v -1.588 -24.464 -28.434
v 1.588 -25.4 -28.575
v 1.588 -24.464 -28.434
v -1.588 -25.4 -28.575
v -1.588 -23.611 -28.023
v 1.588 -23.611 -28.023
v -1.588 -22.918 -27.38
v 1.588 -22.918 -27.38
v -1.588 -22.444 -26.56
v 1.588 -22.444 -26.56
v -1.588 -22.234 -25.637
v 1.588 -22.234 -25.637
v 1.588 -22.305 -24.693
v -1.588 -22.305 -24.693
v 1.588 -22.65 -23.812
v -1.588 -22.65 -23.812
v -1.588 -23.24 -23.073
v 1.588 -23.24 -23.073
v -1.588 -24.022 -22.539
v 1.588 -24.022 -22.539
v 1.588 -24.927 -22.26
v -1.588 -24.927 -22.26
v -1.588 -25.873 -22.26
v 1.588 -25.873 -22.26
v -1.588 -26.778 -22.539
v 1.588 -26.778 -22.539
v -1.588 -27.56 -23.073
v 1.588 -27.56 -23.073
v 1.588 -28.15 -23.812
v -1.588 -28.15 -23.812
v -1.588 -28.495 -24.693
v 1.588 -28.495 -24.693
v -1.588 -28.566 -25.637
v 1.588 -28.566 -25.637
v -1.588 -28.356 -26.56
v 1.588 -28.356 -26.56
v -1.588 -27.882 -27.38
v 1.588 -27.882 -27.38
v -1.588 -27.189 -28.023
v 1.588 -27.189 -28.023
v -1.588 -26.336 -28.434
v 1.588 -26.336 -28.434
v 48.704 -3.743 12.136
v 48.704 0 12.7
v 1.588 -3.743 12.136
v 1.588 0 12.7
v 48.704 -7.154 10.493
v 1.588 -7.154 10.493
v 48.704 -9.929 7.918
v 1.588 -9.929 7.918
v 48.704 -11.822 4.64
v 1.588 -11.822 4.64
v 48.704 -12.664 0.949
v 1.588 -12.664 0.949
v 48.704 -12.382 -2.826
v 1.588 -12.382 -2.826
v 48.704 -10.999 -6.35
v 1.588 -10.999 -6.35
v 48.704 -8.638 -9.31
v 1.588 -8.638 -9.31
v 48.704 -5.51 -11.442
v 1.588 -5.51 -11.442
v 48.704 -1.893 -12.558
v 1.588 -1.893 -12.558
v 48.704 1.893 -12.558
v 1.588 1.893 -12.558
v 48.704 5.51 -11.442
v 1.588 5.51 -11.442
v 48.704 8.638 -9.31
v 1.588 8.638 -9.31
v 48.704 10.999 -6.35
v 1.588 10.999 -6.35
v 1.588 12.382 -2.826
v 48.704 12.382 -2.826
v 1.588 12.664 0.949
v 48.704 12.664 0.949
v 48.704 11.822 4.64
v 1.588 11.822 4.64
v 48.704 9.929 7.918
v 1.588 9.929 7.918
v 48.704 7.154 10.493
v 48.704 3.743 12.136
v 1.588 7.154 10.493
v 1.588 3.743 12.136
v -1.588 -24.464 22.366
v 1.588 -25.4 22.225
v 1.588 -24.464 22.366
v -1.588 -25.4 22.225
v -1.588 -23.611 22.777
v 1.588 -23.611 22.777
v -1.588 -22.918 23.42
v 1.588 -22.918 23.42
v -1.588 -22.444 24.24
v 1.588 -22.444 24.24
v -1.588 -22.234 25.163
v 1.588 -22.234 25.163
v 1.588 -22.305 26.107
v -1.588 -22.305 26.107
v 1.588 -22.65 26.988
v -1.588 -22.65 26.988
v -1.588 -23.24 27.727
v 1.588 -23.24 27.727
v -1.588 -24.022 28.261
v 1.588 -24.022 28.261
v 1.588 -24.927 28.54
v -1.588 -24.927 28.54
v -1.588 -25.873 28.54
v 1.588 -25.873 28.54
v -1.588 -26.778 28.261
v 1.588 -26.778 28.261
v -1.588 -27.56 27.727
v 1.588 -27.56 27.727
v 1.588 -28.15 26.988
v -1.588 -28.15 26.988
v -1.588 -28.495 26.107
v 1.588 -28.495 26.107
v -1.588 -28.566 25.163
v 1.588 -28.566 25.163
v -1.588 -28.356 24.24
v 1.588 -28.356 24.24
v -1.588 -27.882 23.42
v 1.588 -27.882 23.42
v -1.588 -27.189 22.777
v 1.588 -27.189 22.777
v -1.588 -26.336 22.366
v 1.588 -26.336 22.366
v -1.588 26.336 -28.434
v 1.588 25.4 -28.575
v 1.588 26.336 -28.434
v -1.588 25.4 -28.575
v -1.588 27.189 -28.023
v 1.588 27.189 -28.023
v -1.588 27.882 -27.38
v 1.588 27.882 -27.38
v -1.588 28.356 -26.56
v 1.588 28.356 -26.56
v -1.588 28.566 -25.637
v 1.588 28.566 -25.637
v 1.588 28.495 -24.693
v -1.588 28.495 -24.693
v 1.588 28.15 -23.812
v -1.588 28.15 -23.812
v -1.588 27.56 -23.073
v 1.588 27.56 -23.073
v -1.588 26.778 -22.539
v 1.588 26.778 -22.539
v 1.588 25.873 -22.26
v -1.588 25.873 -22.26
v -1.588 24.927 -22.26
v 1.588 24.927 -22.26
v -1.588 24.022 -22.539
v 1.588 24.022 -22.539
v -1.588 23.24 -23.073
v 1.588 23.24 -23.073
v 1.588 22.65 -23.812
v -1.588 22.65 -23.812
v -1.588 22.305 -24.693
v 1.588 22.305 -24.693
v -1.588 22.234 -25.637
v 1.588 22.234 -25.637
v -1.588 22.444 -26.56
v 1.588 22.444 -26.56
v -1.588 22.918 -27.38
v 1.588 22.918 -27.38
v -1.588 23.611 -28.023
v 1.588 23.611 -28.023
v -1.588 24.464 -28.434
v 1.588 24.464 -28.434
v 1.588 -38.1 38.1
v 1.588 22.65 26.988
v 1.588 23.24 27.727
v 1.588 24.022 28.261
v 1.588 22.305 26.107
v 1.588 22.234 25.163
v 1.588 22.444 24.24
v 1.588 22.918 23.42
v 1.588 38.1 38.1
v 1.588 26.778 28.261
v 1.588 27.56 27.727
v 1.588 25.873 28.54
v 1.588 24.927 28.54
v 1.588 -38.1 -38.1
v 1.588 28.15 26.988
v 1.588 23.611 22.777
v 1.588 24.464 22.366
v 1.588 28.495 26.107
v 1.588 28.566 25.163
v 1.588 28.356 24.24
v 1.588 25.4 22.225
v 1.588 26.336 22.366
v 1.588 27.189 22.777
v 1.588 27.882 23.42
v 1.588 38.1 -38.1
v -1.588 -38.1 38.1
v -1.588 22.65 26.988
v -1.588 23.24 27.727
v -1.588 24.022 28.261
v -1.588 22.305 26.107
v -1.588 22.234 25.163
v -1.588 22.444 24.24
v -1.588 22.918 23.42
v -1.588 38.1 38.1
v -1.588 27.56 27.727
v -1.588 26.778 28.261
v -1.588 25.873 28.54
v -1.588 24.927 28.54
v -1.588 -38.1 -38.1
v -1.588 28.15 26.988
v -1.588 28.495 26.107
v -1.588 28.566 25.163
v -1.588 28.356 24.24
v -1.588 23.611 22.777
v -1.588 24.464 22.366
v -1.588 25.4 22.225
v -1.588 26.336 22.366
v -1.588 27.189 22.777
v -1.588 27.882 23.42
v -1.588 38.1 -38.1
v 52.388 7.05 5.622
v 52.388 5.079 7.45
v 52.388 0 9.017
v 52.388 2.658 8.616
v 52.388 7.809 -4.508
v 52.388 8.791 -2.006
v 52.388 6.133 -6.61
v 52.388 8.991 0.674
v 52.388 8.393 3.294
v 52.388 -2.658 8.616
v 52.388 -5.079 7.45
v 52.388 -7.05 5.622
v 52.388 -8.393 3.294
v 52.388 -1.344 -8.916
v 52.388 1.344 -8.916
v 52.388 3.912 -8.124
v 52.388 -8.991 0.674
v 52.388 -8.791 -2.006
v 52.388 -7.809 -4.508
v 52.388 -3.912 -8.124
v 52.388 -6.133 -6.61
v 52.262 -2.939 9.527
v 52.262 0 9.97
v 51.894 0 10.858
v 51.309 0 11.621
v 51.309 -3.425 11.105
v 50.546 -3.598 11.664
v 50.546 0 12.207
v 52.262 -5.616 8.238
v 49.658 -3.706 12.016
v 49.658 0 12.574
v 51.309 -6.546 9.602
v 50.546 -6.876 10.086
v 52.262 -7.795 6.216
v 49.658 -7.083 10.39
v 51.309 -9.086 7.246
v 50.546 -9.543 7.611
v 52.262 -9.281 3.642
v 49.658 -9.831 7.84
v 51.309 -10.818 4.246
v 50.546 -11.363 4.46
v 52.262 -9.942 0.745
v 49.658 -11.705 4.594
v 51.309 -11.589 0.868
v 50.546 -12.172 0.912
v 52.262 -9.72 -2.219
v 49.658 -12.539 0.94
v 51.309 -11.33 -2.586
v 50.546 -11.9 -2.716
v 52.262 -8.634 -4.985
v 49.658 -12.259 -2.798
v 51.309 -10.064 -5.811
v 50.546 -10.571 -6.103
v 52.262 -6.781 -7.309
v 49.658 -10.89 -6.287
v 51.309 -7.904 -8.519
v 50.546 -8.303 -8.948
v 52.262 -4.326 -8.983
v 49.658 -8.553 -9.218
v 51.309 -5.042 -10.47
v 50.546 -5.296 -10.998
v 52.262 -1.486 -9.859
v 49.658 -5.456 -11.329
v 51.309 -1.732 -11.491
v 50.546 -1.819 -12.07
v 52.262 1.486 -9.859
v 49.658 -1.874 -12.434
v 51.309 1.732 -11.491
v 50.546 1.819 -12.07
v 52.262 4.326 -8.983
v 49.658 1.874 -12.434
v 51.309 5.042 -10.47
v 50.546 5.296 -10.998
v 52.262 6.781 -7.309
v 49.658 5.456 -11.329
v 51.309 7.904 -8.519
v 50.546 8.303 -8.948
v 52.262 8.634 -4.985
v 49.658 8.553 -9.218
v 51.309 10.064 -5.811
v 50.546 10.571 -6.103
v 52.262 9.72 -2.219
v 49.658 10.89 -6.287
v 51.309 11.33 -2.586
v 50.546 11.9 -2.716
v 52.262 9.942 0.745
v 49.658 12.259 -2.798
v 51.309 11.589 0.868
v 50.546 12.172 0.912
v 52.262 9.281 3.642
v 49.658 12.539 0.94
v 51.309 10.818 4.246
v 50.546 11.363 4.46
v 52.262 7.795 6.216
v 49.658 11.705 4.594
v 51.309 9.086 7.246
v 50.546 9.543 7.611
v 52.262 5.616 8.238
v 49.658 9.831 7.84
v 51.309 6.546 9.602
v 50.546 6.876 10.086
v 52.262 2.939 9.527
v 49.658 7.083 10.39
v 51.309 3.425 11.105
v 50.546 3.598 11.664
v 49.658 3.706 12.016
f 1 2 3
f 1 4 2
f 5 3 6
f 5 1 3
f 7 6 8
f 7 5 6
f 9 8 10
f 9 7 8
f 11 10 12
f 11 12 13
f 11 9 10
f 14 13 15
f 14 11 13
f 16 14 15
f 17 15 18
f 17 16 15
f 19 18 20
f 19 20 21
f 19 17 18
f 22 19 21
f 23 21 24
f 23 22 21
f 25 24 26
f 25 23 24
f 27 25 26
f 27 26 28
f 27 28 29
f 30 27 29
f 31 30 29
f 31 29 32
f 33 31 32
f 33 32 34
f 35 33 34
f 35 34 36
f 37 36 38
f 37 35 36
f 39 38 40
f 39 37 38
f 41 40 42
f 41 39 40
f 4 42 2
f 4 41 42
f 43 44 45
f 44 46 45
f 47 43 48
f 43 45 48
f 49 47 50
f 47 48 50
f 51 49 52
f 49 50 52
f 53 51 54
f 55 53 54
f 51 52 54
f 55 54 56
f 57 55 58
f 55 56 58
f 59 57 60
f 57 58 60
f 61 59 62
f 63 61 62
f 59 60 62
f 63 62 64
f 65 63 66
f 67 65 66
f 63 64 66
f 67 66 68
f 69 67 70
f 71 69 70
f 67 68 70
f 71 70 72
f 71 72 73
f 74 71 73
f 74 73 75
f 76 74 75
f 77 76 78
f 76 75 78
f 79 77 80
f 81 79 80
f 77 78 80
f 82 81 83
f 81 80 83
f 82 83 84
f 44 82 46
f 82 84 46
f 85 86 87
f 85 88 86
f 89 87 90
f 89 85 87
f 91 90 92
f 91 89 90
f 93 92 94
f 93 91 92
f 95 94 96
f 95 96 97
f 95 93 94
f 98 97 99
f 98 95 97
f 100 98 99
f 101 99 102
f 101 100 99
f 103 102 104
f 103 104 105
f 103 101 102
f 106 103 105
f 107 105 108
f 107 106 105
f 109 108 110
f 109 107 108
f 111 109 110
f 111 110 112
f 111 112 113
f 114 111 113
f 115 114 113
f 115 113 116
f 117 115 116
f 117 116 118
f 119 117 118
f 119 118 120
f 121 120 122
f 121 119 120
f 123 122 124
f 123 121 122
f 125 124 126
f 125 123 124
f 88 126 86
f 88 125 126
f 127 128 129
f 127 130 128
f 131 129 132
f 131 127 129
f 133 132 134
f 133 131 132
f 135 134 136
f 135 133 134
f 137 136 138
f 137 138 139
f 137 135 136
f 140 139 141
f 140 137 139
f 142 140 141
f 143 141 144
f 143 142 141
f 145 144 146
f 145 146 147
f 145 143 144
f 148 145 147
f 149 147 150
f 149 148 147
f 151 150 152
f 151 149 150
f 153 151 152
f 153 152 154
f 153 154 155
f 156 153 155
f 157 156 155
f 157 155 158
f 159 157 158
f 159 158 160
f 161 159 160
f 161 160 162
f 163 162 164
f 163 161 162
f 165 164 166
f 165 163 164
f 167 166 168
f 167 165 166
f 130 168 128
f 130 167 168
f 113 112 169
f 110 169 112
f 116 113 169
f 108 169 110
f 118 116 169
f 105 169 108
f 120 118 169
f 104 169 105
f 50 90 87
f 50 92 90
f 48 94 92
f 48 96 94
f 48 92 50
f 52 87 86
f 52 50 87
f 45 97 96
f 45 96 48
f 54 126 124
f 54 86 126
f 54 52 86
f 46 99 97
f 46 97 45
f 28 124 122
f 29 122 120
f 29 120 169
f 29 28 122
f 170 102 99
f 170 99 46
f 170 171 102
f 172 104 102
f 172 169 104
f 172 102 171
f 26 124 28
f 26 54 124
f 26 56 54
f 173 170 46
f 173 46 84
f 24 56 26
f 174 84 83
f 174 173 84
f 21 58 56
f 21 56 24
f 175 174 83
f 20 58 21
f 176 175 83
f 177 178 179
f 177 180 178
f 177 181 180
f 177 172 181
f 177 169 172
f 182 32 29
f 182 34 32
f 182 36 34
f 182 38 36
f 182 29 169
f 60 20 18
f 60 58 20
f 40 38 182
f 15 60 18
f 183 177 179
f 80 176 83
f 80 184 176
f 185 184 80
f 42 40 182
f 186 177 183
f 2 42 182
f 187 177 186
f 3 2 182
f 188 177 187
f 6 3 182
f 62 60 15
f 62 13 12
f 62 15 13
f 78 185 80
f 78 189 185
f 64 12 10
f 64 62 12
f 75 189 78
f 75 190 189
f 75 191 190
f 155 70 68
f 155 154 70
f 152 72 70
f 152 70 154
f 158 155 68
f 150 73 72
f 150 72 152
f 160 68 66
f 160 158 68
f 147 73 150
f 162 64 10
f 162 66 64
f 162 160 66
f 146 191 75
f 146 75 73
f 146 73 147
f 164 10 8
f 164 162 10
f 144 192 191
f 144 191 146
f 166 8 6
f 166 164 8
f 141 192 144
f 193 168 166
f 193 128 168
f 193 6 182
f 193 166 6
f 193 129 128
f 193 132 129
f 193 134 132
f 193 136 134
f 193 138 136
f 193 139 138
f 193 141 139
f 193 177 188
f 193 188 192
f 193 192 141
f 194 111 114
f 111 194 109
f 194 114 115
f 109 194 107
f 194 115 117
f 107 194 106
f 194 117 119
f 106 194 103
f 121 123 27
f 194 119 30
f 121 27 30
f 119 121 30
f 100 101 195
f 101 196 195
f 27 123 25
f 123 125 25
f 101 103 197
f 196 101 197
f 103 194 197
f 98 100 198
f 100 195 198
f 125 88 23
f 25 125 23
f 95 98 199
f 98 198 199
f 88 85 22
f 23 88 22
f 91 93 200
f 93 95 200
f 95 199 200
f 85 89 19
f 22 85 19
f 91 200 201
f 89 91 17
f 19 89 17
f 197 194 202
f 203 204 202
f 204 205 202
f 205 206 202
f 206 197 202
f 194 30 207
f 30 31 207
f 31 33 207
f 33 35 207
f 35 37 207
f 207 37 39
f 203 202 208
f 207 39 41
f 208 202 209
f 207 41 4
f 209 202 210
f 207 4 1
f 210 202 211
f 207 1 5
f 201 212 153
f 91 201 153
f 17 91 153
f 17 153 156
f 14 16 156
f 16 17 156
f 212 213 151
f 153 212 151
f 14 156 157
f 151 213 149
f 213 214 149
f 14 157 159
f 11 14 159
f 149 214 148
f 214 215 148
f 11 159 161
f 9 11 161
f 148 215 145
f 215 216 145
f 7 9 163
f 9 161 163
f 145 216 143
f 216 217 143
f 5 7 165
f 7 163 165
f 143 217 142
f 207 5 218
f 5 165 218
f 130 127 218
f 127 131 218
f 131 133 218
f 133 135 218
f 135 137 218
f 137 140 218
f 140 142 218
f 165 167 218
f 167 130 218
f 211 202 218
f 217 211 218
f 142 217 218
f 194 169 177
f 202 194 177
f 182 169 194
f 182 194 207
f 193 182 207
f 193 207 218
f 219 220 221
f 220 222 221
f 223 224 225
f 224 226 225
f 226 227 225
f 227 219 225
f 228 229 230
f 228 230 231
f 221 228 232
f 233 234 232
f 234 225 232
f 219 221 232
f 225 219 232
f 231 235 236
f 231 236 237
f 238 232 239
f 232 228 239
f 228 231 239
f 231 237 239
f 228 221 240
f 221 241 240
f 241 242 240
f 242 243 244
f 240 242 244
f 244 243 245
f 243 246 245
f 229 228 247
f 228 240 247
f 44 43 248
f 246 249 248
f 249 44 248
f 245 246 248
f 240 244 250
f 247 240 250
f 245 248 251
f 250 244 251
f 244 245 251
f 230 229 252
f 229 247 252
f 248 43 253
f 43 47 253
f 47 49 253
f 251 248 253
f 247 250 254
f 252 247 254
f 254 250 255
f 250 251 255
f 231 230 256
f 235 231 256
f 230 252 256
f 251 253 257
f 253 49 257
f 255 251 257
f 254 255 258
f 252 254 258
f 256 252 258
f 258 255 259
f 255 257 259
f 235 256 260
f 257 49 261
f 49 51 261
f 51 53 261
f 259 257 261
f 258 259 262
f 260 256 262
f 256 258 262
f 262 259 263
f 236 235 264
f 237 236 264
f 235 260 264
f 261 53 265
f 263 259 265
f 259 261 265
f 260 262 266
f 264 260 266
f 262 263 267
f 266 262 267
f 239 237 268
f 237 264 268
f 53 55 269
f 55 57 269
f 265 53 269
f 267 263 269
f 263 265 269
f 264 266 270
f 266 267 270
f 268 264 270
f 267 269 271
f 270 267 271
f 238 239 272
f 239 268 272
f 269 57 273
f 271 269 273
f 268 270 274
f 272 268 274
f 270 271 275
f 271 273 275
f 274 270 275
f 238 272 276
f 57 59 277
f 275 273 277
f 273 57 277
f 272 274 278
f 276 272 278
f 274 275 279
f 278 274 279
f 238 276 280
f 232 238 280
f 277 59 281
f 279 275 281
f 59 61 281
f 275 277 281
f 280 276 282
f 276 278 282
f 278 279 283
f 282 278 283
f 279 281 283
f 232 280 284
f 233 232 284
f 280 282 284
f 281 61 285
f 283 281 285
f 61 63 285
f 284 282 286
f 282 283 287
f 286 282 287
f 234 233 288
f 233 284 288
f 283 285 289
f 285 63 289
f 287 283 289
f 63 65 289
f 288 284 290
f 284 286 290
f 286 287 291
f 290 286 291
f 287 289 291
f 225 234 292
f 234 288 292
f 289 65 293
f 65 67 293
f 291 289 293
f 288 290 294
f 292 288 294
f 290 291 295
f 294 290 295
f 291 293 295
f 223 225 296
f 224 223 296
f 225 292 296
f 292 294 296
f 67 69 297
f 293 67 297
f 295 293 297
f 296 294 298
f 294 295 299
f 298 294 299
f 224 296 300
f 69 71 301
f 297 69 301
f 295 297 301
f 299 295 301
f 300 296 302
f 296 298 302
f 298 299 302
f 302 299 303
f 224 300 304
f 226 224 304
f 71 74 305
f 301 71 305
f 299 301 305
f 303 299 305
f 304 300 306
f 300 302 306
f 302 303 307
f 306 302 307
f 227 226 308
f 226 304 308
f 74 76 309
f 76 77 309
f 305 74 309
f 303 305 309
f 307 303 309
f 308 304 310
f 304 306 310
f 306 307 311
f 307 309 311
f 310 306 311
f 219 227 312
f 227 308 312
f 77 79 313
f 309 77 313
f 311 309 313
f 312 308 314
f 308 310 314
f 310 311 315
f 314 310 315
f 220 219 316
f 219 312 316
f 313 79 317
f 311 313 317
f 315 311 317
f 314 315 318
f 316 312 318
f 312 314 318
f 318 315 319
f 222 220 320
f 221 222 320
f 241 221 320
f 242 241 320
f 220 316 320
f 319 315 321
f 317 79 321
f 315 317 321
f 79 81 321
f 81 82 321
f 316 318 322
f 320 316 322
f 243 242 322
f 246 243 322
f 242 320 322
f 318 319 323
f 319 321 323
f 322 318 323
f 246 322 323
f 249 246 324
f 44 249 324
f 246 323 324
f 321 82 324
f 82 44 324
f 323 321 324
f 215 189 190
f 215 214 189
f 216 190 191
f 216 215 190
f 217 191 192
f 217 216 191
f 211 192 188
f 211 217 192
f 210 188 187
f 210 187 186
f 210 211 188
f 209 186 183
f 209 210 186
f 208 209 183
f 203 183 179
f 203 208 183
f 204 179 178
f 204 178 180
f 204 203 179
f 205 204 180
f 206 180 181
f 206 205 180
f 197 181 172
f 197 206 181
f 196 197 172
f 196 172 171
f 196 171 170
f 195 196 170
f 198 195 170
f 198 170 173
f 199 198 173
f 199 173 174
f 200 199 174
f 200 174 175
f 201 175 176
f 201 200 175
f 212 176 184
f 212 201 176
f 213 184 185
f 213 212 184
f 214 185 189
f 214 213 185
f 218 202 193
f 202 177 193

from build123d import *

# Parameters (mm, degrees)
SKETCH1_W           = 76.2
SKETCH1_H           = 76.2
SKETCH1_R           = 3.175
BOSS_EXTRUDE1_DEPTH = 1.5875


with BuildPart() as part:
    # Sketch1 → Boss-Extrude1 (new, symmetric)
    with BuildSketch(Plane(origin=(0, 0, 0), x_dir=(0, 0, -1), z_dir=(1, 0, 0))):
        Rectangle(SKETCH1_W, SKETCH1_H)
        with Locations((-25.4, 25.4)):
            Circle(SKETCH1_R, mode=Mode.SUBTRACT)
        with Locations((25.4, 25.4)):
            Circle(SKETCH1_R, mode=Mode.SUBTRACT)
        with Locations((25.4, -25.4)):
            Circle(SKETCH1_R, mode=Mode.SUBTRACT)
        with Locations((-25.4, -25.4)):
            Circle(SKETCH1_R, mode=Mode.SUBTRACT)
    extrude(amount=BOSS_EXTRUDE1_DEPTH, both=True)

    # Sketch2 → Revolve1 (revolve)
    with BuildSketch(Plane.XY, mode=Mode.PRIVATE) as revolve1_sk:
        with BuildLine():
            Line((48.70420202, 12.7), (1.5875, 12.7))
            Line((1.5875, 12.7), (1.5875, 0))
            Line((1.5875, 0), (52.3875, 0))
            Line((52.3875, 0), (52.3875, 9.01670202))
            ThreePointArc((52.3875, 9.01670202), (51.308686999, 11.621186999), (48.70420202, 12.7))
        make_face()
    revolve(revolve1_sk.sketch.rotate(Axis((1.5875, 0, 0), (1, 0, 0)), 90), axis=Axis((1.5875, 0, 0), (1, 0, 0)))


solid = part.part
